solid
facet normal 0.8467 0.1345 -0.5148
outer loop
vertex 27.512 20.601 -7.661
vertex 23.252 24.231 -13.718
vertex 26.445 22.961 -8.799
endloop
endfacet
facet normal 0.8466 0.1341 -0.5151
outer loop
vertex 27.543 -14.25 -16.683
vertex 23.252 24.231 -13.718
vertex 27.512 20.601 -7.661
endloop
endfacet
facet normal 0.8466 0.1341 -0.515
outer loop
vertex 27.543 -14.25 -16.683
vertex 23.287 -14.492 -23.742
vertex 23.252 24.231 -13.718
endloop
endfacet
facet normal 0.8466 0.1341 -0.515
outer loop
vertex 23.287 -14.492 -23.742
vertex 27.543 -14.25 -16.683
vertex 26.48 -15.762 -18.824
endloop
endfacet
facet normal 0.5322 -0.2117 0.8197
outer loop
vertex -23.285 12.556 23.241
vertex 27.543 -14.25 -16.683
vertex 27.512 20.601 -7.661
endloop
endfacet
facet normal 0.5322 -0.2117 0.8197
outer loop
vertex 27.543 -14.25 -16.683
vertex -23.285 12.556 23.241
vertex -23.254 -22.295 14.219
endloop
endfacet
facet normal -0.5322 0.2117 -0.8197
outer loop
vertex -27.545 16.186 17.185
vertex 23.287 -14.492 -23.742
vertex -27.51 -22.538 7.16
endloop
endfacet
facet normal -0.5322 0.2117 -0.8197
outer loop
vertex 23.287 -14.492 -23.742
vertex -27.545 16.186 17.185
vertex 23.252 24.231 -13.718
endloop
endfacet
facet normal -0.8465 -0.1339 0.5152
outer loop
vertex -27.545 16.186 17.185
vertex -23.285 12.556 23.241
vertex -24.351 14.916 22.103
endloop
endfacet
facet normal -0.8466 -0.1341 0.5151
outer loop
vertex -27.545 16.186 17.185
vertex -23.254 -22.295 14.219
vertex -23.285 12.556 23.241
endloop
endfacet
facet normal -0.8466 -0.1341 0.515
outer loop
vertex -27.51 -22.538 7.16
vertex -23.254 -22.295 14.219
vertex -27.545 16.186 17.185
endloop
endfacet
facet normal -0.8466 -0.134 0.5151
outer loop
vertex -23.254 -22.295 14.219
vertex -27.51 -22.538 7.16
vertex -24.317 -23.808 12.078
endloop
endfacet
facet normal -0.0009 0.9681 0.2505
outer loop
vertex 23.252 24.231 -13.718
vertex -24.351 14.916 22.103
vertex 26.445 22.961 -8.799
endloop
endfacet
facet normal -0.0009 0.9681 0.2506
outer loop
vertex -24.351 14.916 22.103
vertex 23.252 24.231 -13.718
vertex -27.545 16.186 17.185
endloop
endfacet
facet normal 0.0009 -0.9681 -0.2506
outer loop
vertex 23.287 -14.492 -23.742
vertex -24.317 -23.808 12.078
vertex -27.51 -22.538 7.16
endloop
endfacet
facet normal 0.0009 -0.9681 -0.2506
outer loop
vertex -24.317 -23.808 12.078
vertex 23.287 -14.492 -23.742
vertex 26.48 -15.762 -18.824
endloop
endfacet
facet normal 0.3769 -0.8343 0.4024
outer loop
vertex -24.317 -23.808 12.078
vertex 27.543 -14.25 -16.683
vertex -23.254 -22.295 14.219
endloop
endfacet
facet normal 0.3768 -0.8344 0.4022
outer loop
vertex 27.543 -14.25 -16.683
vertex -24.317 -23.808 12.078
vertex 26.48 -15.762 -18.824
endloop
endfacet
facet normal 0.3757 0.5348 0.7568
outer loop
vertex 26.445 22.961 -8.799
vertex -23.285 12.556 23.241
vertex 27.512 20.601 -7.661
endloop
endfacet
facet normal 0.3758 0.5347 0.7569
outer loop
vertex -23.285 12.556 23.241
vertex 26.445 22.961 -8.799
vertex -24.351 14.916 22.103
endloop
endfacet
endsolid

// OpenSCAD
// file: chamfered_block.scad
// Hand-written ground truth. Coordinates: [0,L] x [0,W] x [0,H].
$fn = 64;
body_length = 60;
body_width = 40;
body_height = 8;
chamfer_1_width = 2;
chamfer_2_width = 2;

module chamfered_block(body_length=60, body_width=40, body_height=8,
                       chamfer_1_width=2, chamfer_2_width=2) {
    assert(min(body_length,body_width,body_height)>0);
    assert(min(chamfer_1_width,chamfer_2_width)>0);
    assert(max(chamfer_1_width,chamfer_2_width)<body_height);
    assert(chamfer_1_width+chamfer_2_width<body_width);
    module along_x() {
        multmatrix([[0,0,1,-1],[1,0,0,0],[0,1,0,0],[0,0,0,1]])
            linear_extrude(height=body_length+2) children();
    }
    difference() {
        cube([body_length,body_width,body_height]);
        along_x() polygon([[0,body_height],
            [chamfer_1_width,body_height],[0,body_height-chamfer_1_width]]);
        along_x() polygon([[body_width,body_height],
            [body_width-chamfer_2_width,body_height],
            [body_width,body_height-chamfer_2_width]]);
    }
}

chamfered_block(body_length,body_width,body_height,chamfer_1_width,chamfer_2_width);
// main file
use <chamfered_block.scad>
$fn = 64;
body_length = 60;
body_width = 40;
body_height = 8;
chamfer_1_width = 2;
chamfer_2_width = 2;

rotate([17,31,9]) translate([-body_length/2,-body_width/2,-body_height/2])
    chamfered_block(body_length,body_width,body_height,chamfer_1_width,chamfer_2_width);
